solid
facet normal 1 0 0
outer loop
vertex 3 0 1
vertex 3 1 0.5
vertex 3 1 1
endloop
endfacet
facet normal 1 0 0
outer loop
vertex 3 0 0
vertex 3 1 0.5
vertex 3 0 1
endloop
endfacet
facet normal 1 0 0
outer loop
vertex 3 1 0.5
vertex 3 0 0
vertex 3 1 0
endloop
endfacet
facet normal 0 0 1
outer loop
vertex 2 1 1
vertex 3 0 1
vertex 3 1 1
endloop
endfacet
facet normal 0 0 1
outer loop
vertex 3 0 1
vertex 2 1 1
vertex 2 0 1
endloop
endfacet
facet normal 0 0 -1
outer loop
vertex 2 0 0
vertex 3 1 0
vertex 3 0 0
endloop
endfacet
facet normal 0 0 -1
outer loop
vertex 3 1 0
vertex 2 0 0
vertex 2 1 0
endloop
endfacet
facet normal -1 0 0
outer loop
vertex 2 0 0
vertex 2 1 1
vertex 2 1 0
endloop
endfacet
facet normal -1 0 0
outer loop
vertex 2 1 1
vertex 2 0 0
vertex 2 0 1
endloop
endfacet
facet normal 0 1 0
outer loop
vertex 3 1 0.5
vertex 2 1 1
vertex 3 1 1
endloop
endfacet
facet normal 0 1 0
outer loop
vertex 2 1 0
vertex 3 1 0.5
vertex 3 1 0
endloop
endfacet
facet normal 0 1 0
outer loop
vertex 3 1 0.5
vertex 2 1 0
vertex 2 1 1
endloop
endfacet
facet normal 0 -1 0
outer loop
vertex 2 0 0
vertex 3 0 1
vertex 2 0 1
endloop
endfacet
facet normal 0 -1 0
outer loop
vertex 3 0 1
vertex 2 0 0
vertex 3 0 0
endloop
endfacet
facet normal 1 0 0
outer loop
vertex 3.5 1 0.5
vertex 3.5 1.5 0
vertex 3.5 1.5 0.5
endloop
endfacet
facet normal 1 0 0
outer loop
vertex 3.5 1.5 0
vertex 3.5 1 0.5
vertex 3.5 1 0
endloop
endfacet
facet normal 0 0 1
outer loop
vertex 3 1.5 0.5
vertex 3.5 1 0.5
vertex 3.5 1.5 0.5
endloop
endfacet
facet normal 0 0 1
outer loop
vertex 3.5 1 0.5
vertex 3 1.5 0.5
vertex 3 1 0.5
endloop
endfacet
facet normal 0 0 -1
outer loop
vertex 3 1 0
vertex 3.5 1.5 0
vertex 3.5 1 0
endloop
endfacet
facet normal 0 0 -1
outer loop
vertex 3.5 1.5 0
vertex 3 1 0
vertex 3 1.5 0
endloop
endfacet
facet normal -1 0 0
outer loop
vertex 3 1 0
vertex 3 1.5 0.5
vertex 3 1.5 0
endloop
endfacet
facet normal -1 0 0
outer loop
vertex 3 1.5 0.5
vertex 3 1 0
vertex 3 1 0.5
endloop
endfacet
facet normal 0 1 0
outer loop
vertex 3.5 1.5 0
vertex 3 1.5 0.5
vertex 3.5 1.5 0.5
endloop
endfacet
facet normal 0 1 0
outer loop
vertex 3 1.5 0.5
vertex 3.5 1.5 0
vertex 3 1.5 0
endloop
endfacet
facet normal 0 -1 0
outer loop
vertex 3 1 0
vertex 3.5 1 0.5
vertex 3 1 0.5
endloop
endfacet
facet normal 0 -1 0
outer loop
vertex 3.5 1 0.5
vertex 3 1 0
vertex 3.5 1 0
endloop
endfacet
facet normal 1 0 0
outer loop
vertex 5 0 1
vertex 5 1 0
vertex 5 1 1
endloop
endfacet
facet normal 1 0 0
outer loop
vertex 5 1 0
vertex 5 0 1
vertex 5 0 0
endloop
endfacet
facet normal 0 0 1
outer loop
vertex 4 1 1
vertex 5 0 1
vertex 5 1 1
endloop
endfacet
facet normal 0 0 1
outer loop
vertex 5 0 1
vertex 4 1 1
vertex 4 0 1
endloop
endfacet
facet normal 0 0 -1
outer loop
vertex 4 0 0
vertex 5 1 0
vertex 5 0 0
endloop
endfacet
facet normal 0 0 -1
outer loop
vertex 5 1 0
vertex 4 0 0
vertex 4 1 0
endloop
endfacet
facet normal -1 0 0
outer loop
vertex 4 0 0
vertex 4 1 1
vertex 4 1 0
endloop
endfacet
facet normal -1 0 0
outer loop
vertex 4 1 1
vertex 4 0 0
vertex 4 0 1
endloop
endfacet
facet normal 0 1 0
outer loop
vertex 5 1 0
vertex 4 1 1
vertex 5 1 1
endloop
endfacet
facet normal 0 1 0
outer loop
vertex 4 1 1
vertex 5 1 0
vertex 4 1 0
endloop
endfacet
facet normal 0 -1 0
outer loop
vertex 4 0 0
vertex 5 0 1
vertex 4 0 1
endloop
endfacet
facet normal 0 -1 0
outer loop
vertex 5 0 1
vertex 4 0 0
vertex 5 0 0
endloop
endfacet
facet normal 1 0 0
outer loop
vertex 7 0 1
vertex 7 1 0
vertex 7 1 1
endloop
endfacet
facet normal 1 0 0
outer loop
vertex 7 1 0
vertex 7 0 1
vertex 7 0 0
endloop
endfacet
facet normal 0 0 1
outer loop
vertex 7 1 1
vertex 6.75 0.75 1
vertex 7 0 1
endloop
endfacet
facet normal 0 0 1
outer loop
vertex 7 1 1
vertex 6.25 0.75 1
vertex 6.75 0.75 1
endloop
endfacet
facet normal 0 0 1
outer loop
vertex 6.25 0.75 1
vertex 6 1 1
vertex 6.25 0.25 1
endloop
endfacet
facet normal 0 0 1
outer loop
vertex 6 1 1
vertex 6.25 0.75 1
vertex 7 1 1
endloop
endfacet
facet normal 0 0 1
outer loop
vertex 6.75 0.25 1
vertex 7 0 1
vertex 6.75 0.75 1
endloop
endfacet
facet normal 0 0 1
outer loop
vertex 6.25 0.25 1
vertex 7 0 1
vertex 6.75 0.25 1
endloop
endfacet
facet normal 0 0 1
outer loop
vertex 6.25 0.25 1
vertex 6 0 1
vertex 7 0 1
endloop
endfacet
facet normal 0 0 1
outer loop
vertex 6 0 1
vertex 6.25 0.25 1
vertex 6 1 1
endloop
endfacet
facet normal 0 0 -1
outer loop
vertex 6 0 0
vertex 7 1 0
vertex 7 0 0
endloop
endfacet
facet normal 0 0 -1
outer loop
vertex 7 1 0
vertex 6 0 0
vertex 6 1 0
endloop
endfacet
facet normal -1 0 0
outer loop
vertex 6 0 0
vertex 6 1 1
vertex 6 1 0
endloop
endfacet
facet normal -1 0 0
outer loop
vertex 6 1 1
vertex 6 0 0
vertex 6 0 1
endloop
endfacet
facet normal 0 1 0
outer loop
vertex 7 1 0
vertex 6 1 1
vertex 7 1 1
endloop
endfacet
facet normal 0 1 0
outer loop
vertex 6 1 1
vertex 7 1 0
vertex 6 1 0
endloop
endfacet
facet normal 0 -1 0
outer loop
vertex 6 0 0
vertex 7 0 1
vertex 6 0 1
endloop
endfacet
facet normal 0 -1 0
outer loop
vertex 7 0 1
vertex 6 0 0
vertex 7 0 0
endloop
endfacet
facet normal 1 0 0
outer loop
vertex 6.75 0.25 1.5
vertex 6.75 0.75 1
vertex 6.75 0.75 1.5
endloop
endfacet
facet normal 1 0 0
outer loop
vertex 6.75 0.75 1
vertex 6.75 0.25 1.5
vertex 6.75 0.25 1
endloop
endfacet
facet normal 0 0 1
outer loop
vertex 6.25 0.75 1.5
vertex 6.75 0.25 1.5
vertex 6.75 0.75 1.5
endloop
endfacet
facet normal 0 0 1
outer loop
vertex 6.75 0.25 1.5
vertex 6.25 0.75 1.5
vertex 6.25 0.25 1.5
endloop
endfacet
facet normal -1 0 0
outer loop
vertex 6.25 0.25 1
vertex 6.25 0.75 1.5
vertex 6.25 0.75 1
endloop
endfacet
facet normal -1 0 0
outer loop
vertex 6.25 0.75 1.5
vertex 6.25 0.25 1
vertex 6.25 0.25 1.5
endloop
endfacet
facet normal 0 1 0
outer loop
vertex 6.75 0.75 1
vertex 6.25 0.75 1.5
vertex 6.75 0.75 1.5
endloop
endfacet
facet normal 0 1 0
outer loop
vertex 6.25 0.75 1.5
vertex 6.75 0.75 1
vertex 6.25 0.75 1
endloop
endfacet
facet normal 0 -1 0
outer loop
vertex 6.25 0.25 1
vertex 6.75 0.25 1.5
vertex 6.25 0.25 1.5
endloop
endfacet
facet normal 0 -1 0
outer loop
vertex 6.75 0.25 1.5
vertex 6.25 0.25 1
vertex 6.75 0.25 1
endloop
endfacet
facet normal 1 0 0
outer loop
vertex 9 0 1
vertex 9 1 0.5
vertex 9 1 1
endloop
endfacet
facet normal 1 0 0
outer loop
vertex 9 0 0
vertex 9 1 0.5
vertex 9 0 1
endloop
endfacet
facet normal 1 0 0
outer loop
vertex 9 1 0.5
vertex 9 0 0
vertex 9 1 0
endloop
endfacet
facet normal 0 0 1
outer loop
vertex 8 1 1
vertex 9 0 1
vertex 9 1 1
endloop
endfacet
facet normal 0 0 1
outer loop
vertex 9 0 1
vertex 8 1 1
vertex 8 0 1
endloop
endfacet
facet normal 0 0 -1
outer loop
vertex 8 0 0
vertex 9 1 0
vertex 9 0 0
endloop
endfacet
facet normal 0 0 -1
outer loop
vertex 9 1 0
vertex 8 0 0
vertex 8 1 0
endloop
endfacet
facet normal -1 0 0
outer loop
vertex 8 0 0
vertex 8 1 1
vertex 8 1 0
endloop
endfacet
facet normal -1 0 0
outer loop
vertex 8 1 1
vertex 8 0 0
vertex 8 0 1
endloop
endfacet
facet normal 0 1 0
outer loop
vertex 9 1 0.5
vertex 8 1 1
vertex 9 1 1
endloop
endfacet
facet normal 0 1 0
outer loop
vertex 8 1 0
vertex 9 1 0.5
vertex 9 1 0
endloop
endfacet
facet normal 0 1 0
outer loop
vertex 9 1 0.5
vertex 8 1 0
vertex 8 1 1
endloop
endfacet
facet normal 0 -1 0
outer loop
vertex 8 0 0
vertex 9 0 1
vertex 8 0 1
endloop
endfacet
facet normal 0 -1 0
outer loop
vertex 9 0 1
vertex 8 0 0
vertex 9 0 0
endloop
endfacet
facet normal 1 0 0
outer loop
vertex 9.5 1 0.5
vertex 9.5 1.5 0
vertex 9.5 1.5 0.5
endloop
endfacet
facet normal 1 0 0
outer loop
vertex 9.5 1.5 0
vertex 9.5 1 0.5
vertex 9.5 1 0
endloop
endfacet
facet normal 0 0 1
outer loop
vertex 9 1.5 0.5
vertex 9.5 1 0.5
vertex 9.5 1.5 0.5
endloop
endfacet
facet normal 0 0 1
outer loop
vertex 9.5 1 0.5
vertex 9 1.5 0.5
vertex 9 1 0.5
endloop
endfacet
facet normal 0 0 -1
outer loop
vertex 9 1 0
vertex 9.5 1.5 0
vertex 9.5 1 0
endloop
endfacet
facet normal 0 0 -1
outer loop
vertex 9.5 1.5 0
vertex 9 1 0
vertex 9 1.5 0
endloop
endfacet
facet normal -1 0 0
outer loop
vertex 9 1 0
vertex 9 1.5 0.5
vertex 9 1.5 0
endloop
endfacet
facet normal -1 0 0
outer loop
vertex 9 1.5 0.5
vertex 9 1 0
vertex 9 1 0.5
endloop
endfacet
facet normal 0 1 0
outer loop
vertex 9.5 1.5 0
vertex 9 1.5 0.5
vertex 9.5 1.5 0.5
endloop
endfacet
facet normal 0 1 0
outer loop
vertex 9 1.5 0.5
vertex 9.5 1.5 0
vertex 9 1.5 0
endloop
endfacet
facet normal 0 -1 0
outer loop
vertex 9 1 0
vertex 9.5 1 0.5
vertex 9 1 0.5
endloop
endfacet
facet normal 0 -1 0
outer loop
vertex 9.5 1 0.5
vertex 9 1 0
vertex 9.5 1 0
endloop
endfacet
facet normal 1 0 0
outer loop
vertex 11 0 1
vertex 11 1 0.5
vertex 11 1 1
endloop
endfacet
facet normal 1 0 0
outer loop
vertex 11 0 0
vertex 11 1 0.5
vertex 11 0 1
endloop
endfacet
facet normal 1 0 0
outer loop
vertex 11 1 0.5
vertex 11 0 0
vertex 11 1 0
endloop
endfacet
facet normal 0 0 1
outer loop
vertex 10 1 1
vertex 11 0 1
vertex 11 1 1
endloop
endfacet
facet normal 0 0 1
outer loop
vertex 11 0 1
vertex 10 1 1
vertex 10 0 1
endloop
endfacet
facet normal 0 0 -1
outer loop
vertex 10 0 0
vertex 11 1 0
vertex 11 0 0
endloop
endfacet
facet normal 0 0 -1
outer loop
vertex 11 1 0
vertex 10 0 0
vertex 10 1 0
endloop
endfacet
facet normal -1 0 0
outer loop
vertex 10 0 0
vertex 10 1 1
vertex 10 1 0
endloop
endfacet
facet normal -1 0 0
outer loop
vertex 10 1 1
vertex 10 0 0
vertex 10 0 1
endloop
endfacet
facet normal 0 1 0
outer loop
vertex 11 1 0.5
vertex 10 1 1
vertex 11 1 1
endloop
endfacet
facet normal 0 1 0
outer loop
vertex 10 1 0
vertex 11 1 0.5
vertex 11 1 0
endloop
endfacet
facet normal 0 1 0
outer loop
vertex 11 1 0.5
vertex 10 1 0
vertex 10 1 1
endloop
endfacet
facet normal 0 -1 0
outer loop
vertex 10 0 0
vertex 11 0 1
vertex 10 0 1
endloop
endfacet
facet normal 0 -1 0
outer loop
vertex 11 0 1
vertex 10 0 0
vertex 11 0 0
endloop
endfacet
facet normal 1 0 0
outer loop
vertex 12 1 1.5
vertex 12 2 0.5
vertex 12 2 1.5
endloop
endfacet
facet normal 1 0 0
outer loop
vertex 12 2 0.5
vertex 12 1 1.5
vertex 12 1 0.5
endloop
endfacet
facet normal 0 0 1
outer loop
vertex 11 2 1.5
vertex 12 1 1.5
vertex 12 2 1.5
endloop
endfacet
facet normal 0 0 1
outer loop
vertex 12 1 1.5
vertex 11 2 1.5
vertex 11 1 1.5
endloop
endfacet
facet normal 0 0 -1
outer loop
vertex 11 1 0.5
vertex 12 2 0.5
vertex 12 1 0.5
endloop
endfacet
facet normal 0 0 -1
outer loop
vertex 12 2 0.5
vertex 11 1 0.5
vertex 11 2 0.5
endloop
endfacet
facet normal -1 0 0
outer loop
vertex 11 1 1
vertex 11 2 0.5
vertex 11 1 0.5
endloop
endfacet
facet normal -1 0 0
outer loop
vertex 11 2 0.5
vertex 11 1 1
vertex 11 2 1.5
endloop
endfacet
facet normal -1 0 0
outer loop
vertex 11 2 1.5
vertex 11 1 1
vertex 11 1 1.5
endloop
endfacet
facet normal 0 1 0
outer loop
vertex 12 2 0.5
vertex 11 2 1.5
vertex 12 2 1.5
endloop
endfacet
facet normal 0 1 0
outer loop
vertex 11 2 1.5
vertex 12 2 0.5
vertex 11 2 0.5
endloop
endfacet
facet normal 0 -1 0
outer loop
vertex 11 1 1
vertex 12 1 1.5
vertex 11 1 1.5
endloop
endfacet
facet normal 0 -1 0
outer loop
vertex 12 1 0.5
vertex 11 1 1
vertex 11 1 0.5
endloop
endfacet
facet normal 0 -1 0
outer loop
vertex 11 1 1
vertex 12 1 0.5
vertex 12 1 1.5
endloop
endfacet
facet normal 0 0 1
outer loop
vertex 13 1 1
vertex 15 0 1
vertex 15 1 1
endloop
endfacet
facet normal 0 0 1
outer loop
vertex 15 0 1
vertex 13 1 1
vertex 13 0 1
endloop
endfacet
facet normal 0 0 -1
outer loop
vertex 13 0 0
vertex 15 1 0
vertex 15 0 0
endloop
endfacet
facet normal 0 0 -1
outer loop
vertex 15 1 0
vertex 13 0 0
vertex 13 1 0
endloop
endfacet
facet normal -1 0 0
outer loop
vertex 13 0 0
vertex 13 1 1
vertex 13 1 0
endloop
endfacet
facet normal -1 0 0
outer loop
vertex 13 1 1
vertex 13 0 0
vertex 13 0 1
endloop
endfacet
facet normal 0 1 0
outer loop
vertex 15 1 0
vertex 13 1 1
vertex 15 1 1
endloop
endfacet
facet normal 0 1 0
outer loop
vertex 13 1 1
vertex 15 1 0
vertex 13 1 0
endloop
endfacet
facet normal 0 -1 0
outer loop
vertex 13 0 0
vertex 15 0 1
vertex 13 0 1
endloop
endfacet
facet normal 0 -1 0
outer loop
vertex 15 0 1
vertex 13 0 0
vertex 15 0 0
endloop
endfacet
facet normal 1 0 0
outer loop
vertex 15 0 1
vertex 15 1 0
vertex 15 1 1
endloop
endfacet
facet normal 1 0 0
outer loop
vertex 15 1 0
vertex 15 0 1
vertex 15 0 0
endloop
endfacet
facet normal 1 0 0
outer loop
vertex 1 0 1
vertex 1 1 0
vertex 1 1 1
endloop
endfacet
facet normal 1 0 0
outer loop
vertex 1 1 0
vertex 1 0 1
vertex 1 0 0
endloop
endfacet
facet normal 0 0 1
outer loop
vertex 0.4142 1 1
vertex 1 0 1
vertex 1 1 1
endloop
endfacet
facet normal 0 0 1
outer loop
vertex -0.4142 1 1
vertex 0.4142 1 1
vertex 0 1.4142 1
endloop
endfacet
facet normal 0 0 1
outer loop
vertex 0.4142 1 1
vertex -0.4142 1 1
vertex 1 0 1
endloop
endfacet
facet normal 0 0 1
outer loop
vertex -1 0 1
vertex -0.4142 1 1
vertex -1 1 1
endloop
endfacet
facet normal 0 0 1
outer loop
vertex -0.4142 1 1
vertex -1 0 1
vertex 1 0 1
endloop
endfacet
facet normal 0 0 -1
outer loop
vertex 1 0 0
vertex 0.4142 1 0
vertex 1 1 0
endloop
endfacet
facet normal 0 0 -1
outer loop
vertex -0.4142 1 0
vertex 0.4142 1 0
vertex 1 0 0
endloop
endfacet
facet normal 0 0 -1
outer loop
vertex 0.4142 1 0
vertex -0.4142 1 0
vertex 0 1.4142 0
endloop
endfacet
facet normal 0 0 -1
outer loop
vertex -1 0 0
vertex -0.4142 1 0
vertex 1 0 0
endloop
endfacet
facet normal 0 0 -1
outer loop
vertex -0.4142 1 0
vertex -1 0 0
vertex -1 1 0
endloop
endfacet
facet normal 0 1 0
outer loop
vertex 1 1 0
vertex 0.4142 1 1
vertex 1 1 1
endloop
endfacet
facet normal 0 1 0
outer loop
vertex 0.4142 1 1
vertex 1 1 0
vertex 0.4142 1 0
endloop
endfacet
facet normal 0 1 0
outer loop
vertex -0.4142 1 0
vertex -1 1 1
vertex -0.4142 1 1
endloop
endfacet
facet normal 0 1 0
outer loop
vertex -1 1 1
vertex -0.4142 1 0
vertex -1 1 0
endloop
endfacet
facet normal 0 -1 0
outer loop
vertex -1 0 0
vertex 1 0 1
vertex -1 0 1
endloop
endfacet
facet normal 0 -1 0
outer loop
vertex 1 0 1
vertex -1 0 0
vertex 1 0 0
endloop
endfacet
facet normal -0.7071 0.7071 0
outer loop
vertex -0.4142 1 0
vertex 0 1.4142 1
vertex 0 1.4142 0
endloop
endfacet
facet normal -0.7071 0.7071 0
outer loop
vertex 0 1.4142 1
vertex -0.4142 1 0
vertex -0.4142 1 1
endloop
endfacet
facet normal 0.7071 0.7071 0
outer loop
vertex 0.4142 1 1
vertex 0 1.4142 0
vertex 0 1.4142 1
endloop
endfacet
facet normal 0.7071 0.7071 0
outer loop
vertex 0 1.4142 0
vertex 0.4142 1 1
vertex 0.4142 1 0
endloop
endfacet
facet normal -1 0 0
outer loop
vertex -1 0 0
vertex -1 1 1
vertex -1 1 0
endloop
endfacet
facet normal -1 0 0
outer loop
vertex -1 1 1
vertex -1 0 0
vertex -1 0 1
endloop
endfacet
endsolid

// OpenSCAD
// These are cases where solids share edges or vertices, which can be challenging
// for some libraries used for rendering (e.g. corefinement functions in CGAL's
// polygon mesh processing package) and must be worked around by OpenSCAD.

cube(1);
rotate([0, 0, 45]) cube(1);
rotate([0, 0, 90]) cube(1);

translate([2, 0, 0]) {
  union() {
    cube(1);
    translate([1, 1, 0]) cube(0.5);
  }
}

translate([4, 0, 0]) {
  difference() {
    cube(1);
    translate([1, 1, 0]) cube(1);
  }
}

translate([6, 0, 0]) {
  cube(1);
  translate([0.25, 0.25, 1]) cube(0.5);
}

translate([8, 0, 0]) {
  cube(1);
  translate([1, 1, 0]) cube(0.5);
}

translate([10, 0, 0]) {
  cube(1);
  translate([1, 1, 0.5]) cube(1);
}

translate([13, 0, 0]) {
  cube(1);
  translate([1, 0, 0]) cube(1);
}
